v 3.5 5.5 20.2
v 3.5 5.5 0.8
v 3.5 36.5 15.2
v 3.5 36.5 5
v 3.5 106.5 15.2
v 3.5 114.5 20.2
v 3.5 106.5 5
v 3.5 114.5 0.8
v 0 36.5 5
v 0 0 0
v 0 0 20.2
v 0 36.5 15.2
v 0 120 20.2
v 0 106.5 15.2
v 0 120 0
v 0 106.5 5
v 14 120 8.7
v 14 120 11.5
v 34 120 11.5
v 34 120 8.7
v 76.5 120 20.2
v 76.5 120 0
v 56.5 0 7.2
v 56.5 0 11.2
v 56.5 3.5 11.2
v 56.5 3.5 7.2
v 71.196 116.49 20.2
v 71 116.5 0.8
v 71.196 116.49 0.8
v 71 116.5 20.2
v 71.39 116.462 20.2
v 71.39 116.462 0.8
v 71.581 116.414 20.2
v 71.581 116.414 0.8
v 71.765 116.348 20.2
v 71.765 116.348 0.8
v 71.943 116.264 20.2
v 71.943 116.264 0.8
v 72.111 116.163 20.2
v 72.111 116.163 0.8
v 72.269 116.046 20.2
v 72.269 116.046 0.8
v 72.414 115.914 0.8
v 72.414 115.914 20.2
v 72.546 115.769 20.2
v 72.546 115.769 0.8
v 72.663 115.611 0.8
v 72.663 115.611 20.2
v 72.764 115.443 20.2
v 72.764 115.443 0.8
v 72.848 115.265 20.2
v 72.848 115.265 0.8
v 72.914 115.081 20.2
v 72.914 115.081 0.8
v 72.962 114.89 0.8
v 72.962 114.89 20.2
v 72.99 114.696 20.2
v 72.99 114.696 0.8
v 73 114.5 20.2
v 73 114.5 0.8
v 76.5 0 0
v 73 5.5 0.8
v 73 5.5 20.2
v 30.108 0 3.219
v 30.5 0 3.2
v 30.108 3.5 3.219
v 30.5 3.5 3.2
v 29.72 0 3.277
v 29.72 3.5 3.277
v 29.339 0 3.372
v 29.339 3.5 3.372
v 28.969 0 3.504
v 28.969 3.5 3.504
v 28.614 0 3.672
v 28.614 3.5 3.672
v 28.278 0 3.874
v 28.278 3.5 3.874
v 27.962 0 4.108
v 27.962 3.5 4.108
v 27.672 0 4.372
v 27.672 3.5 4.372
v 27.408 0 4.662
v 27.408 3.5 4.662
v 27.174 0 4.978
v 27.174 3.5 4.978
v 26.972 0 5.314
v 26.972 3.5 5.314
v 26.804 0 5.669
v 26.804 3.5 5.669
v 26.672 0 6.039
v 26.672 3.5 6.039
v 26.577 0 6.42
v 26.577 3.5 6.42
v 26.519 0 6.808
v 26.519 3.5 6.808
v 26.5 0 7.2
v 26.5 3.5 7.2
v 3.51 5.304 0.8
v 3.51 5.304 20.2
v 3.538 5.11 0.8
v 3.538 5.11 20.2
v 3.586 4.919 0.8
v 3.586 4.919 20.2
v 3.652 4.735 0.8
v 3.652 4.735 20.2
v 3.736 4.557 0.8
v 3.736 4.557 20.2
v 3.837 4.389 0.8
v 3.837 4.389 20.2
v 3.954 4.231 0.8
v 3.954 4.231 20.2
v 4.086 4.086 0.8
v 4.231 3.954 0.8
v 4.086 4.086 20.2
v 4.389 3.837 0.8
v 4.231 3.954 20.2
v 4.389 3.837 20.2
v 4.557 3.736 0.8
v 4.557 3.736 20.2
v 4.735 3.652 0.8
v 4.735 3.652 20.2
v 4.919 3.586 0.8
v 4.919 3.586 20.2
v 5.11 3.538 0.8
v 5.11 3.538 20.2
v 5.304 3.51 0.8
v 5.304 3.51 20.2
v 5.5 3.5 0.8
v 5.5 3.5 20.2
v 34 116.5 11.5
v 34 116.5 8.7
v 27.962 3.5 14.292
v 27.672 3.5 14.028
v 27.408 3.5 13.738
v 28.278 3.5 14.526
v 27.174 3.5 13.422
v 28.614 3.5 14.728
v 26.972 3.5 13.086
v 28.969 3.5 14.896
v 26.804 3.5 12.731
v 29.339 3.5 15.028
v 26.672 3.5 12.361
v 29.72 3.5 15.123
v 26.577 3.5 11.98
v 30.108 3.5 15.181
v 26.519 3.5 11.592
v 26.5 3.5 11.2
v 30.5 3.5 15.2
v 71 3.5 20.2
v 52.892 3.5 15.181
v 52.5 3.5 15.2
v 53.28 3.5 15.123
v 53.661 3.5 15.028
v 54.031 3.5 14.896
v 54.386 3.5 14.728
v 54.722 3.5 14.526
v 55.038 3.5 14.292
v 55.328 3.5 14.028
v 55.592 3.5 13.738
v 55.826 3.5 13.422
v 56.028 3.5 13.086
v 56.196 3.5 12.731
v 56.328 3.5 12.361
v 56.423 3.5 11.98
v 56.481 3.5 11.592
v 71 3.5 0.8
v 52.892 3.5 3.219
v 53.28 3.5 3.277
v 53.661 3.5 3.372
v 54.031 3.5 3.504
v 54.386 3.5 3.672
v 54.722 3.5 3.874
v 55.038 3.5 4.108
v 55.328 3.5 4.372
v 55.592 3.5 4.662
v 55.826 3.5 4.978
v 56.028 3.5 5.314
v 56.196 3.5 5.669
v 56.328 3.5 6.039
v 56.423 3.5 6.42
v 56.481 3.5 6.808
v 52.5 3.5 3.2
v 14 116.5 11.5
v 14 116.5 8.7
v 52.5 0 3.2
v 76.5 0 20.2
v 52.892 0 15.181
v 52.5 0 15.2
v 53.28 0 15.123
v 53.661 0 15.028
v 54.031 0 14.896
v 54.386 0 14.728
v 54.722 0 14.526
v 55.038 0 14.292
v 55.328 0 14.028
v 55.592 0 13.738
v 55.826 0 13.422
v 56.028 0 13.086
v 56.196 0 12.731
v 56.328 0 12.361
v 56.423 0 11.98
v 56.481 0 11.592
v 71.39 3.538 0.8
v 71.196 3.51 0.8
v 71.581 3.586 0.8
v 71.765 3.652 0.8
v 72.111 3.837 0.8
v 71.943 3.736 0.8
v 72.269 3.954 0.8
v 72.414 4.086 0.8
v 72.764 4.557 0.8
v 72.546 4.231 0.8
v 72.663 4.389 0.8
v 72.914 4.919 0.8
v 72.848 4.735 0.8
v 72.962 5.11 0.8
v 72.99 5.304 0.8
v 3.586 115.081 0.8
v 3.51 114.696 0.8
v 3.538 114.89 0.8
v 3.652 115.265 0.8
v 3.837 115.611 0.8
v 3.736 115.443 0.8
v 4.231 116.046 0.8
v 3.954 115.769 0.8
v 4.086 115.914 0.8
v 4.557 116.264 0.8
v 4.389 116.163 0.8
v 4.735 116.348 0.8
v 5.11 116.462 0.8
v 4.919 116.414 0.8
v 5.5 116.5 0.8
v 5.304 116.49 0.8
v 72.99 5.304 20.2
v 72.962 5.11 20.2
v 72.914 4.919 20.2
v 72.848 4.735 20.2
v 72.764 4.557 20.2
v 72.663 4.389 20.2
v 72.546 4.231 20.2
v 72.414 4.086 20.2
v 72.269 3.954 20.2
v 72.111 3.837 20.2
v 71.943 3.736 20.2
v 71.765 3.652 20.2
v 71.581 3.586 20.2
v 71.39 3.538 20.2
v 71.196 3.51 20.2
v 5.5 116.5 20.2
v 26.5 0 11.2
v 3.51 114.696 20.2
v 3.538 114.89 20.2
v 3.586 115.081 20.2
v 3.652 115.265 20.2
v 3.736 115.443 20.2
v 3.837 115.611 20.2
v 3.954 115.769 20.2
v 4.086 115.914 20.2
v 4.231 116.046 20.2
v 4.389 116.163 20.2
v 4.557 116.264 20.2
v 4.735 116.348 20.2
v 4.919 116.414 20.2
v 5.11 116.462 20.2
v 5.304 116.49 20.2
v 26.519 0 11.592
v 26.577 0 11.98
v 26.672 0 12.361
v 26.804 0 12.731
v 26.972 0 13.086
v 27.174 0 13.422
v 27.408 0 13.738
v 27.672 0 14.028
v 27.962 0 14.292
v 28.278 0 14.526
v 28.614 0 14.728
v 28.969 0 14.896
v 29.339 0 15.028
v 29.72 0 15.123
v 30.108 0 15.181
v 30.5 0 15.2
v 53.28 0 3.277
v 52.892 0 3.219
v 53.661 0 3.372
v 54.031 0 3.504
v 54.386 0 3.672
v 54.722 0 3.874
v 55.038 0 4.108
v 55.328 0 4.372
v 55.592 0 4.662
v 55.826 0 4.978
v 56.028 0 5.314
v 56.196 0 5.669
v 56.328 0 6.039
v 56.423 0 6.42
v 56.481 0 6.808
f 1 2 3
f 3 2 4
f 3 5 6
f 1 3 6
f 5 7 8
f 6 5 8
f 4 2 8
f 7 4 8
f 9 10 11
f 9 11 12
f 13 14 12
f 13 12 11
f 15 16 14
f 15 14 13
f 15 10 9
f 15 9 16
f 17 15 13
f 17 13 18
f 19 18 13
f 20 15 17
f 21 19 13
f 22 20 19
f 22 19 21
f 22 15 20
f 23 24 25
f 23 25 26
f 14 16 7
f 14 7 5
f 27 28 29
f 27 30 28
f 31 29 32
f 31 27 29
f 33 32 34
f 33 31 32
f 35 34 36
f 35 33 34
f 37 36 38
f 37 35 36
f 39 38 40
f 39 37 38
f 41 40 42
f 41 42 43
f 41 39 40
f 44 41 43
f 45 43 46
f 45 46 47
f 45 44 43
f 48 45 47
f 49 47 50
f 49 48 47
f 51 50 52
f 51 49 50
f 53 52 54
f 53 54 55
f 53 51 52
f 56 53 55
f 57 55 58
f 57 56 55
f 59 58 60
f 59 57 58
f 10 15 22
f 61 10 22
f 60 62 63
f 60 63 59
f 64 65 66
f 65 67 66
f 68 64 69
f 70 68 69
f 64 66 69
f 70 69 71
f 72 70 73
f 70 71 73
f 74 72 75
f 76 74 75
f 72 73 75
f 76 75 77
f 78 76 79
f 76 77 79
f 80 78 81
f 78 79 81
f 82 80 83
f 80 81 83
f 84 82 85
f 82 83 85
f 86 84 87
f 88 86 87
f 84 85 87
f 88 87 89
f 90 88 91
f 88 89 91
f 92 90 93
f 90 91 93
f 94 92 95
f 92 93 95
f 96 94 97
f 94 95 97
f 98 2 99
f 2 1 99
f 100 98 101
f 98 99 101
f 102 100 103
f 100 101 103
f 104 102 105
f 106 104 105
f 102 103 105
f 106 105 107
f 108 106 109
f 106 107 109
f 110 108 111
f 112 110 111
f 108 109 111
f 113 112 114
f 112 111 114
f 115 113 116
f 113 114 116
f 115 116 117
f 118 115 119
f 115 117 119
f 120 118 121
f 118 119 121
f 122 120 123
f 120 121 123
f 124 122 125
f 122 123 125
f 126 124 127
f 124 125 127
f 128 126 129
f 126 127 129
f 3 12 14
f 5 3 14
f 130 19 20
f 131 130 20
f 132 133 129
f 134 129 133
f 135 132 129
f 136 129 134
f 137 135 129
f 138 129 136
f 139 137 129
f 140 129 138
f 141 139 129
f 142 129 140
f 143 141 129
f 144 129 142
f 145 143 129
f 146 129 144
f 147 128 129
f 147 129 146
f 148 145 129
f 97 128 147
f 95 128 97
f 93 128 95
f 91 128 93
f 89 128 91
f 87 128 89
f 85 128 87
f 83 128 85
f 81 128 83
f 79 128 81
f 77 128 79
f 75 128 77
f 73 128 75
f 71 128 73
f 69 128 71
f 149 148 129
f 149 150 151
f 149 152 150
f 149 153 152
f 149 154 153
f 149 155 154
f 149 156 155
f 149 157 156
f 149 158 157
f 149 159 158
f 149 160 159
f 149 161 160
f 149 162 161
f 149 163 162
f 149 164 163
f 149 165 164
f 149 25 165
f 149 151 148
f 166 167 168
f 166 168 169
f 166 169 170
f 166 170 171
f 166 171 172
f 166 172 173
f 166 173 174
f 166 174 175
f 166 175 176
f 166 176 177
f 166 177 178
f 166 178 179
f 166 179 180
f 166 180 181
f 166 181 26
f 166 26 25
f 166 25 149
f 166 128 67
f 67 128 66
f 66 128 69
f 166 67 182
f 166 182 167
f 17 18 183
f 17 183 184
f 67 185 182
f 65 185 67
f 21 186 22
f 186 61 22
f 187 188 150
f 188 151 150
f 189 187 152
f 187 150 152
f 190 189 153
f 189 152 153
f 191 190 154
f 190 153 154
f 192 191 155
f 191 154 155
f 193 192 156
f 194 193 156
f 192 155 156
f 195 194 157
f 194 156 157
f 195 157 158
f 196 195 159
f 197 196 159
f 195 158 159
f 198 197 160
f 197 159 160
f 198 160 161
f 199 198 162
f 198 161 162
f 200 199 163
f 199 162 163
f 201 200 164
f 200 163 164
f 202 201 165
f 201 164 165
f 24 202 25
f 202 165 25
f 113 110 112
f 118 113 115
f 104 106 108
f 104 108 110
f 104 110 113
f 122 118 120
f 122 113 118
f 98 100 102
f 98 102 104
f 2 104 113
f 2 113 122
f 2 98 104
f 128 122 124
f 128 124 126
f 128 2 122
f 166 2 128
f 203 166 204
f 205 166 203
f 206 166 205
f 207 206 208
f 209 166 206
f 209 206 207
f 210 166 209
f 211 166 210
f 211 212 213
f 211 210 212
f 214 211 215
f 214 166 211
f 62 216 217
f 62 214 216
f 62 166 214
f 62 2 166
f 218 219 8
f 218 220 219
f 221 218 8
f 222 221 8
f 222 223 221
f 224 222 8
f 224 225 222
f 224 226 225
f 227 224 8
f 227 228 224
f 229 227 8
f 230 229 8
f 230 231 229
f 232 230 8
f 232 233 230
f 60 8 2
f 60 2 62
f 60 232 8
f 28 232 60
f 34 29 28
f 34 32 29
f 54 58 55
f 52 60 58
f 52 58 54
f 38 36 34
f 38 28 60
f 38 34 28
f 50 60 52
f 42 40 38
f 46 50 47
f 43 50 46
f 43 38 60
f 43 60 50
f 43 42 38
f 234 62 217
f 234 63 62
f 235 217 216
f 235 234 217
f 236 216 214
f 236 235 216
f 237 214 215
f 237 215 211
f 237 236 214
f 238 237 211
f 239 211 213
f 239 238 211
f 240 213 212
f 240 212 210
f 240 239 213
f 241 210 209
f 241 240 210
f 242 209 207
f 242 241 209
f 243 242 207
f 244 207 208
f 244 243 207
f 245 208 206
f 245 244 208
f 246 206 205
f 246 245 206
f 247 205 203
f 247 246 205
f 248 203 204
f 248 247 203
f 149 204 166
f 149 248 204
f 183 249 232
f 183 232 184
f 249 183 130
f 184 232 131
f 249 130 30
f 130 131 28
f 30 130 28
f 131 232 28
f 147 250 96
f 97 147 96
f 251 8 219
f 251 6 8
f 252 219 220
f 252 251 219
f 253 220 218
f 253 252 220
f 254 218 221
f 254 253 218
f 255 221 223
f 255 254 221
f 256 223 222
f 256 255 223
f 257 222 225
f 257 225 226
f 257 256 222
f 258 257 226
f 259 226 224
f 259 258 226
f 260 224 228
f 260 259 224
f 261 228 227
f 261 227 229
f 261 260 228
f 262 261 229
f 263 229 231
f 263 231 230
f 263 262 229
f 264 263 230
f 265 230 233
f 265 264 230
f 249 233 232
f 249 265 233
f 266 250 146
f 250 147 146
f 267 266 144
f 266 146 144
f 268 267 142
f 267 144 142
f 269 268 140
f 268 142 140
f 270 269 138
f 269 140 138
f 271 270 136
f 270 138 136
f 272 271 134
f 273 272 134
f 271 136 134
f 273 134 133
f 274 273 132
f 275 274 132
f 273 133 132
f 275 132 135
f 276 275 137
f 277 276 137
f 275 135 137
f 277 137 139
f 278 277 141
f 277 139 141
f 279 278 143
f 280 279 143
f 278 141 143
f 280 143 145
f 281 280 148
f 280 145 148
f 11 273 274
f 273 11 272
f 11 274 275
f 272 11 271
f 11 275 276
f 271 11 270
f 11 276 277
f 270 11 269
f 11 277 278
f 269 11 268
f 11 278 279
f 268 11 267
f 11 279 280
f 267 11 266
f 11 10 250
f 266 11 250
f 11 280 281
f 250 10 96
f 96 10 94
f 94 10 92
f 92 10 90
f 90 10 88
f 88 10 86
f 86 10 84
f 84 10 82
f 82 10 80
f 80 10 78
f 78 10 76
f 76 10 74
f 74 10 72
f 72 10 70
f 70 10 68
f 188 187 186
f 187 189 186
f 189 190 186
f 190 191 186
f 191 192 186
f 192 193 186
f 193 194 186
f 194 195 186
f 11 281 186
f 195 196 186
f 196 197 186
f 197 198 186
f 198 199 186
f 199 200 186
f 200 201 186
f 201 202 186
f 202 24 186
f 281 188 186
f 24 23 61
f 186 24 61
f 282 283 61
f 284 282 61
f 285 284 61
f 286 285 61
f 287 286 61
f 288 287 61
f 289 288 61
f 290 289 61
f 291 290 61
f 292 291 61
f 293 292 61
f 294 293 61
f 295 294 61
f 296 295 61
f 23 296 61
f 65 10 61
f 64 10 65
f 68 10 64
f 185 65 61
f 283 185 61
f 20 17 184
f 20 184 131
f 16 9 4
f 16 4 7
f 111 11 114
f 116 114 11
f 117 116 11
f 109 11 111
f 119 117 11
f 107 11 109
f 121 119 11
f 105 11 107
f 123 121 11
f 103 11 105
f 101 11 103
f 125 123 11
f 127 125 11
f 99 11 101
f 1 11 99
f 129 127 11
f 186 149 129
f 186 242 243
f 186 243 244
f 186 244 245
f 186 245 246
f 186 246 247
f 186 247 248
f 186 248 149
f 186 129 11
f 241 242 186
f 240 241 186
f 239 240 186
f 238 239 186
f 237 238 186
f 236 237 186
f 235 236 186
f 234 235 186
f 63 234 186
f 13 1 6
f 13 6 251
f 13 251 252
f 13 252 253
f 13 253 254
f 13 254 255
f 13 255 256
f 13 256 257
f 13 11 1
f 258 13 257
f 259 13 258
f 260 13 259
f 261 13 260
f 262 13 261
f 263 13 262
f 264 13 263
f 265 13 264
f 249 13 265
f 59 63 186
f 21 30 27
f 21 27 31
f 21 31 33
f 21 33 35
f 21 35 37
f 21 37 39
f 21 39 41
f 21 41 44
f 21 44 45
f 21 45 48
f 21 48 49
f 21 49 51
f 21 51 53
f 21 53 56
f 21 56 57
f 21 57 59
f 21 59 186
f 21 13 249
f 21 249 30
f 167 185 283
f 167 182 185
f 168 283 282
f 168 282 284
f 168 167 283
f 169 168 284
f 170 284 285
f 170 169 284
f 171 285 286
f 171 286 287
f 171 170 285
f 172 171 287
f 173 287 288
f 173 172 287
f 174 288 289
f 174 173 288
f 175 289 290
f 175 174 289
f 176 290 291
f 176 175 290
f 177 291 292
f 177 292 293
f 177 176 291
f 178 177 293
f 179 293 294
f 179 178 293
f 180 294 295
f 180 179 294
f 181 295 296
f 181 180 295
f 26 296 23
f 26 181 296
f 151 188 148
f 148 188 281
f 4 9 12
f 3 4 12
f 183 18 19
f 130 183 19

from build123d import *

# Parameters (mm, degrees)
SKETCH_1_W          = 76.5
SKETCH_1_H          = 120
EXTRUDE_1_DEPTH     = 0.8
SKETCH_10_W         = 76.5
SKETCH_10_H         = 120
SKETCH_10_W_2       = 69.5
SKETCH_10_H_2       = 113
EXTRUDE_2_DEPTH     = 19.4
FILLET_1_R          = 2
SKETCH_11_W         = 10.2
SKETCH_11_H         = 70
CUT_EXTRUDE_1_DEPTH = 3.5
SKETCH_12_W         = 30
SKETCH_12_H         = 12
CUT_EXTRUDE_2_DEPTH = 10
FILLET_2_R          = 4
CUT_EXTRUDE_3_REACH = 122
SKETCH_13_W         = 20
SKETCH_13_H         = 2.8


with BuildPart() as part:
    # ｽｹｯﾁ1 → ﾎﾞｽ - 押し出し1 (new body)
    with BuildSketch(Plane.XY):
        with Locations((38.25, 60)):
            Rectangle(SKETCH_1_W, SKETCH_1_H)
    extrude(amount=EXTRUDE_1_DEPTH)

    # ｽｹｯﾁ10 → ﾎﾞｽ - 押し出し2 (add)
    with BuildSketch(Plane.XY.offset(0.8)):
        with Locations((38.25, 60)):
            Rectangle(SKETCH_10_W, SKETCH_10_H)
        with Locations((38.25, 60)):
            Rectangle(SKETCH_10_W_2, SKETCH_10_H_2, mode=Mode.SUBTRACT)
    extrude(amount=EXTRUDE_2_DEPTH)

    # ﾌｨﾚｯﾄ1
    fillet_1_edges = [part.edges().sort_by_distance(p)[0] for p in [
        (73, 116.5, 10.5),
        (3.5, 116.5, 10.5),
        (3.5, 3.5, 10.5),
        (73, 3.5, 10.5),
    ]]
    fillet(fillet_1_edges, radius=FILLET_1_R)

    # ｽｹｯﾁ11 → ｶｯﾄ - 押し出し1 (cut)
    with BuildSketch(Plane.ZY):
        with Locations((10.1, 71.5)):
            Rectangle(SKETCH_11_W, SKETCH_11_H)
    extrude(amount=-CUT_EXTRUDE_1_DEPTH, mode=Mode.SUBTRACT)

    # ｽｹｯﾁ12 → ｶｯﾄ - 押し出し2 (cut)
    with BuildSketch(Plane(origin=(0, 0, 0), x_dir=(-1, 0, 0), z_dir=(0, -1, 0))):
        with Locations((-41.5, -9.2)):
            Rectangle(SKETCH_12_W, SKETCH_12_H)
    extrude(amount=-CUT_EXTRUDE_2_DEPTH, mode=Mode.SUBTRACT)

    # ﾌｨﾚｯﾄ2
    fillet_2_edges = [part.edges().sort_by_distance(p)[0] for p in [
        (56.5, 1.75, 15.2),
        (56.5, 1.75, 3.2),
        (26.5, 1.75, 3.2),
        (26.5, 1.75, 15.2),
    ]]
    fillet(fillet_2_edges, radius=FILLET_2_R)

    # ｽｹｯﾁ13 → ｶｯﾄ - 押し出し3 (cut, up to next)
    with BuildSketch(Plane(origin=(0, 120, 0), x_dir=(1, 0, 0), z_dir=(0, 1, 0)), mode=Mode.PRIVATE) as cut_extrude_3_sk1:
        with Locations((24, -10.1)):
            Rectangle(SKETCH_13_W, SKETCH_13_H)
    cut_extrude_3_tool1 = extrude(cut_extrude_3_sk1.sketch, amount=-CUT_EXTRUDE_3_REACH, mode=Mode.PRIVATE) & part.part
    add(cut_extrude_3_tool1.solids().sort_by_distance((24, 120, 10.1))[0], mode=Mode.SUBTRACT)


solid = part.part
